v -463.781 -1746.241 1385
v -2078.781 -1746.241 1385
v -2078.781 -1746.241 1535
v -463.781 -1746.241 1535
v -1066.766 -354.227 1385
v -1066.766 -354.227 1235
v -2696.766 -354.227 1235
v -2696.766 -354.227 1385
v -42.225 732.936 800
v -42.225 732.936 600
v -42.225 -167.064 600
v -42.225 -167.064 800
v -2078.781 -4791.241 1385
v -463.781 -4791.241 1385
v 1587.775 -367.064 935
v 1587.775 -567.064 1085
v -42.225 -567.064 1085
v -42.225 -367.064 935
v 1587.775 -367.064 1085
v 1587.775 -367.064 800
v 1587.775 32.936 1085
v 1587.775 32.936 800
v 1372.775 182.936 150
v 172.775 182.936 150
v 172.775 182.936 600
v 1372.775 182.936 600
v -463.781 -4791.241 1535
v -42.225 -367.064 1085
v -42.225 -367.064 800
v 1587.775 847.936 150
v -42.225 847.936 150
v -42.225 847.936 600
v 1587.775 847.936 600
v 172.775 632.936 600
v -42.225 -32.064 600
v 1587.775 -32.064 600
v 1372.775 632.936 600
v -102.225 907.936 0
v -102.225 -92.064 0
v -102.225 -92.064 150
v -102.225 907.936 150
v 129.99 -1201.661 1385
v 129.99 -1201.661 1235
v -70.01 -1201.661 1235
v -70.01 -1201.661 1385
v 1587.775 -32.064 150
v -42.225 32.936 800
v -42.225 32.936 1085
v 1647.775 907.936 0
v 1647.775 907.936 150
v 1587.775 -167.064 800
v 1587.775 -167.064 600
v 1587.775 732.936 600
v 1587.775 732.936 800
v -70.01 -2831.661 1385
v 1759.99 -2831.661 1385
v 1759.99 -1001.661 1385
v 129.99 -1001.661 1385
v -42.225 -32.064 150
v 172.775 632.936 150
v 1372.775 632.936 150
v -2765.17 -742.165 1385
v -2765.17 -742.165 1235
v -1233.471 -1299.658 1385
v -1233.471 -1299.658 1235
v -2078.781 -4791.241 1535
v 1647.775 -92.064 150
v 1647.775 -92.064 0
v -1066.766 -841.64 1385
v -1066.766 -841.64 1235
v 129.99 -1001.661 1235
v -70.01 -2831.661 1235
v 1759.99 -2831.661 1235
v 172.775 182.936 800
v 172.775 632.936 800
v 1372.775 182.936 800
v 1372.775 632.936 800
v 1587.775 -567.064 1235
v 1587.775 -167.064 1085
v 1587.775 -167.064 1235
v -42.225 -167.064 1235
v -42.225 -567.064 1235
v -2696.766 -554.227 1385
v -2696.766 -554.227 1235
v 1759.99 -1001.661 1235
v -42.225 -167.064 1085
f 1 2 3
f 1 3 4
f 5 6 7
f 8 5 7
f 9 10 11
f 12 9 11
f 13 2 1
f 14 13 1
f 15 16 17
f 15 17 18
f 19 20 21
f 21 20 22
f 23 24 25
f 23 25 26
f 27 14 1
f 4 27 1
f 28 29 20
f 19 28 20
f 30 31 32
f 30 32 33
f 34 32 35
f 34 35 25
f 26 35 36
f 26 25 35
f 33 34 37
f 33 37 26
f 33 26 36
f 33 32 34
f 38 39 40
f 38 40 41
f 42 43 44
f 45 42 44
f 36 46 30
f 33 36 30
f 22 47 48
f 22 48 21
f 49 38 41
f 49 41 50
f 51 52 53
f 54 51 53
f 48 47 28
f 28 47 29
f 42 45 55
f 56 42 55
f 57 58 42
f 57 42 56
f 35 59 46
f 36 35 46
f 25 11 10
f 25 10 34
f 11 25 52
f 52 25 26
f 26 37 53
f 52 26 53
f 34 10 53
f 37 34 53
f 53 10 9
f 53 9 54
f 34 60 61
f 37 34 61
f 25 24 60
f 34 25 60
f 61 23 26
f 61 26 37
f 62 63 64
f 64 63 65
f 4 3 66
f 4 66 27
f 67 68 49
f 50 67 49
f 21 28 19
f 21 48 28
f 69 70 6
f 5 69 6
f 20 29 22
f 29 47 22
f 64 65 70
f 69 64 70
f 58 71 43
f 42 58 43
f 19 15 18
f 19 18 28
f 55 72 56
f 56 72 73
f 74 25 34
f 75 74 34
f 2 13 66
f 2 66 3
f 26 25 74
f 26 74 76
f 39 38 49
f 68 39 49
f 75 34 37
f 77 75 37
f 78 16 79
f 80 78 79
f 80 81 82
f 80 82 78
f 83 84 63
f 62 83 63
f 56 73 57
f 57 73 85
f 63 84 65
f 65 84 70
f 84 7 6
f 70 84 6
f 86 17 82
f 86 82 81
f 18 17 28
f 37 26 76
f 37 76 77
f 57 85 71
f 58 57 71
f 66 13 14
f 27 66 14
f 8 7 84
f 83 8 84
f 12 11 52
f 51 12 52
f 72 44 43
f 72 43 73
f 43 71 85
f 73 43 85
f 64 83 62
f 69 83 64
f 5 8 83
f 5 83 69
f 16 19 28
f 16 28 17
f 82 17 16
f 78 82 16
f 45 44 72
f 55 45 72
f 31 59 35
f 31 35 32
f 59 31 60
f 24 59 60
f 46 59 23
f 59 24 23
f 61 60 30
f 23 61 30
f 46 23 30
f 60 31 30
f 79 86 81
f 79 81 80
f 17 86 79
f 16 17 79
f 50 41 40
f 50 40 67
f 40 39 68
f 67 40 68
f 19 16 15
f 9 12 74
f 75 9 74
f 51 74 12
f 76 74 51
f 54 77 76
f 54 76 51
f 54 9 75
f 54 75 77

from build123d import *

# Parameters (mm, degrees)
F0_W      = 1750
F0_H      = 1000
F1_DEPTH  = 150
F2_W      = 1630
F2_H      = 880
F2_W_2    = 1200
F2_H_2    = 450
F3_DEPTH  = 450
F4_W      = 1630
F4_H      = 135
F4_H_2    = 765
F4_W_2    = 1200
F4_H_3    = 450
F5_DEPTH  = 200
F6_W      = 1630
F6_H      = 200
F7_DEPTH  = 285
F8_W      = 1630
F8_H      = 400
F9_DEPTH  = 150
F11_DEPTH = 1630
F13_DEPTH = 150
F14_W     = 1615
F14_H     = 3045
F15_DEPTH = 150
F17_DEPTH = 150


with BuildPart() as f1:
    # F0 (on Top) → F1 (new body)
    with BuildSketch(Plane.XY):
        with Locations((772.775441, 407.935686)):
            Rectangle(F0_W, F0_H)
    extrude(amount=F1_DEPTH)


with BuildPart() as f3:
    # F2 (on face) → F3 (new body)
    with BuildSketch(Plane.XY.offset(150)):
        with Locations((772.775441, 407.935686)):
            Rectangle(F2_W, F2_H)
        with Locations((772.775441, 407.935686)):
            Rectangle(F2_W_2, F2_H_2, mode=Mode.SUBTRACT)
    extrude(amount=F3_DEPTH)


with BuildPart() as f5:
    # F4 (on face) → F5 (new body)
    with BuildSketch(Plane.XY.offset(600)):
        with Locations((772.775441, -99.564314)):
            Rectangle(F4_W, F4_H)
        with Locations((772.775441, 350.435686)):
            Rectangle(F4_W, F4_H_2)
        with Locations((772.775441, 407.935686)):
            Rectangle(F4_W_2, F4_H_3, mode=Mode.SUBTRACT)
    extrude(amount=F5_DEPTH)


with BuildPart() as f7:
    # F6 (on face) → F7 (new body)
    with BuildSketch(Plane.XY.offset(800)):
        with Locations((772.775441, -267.064314)):
            Rectangle(F6_W, F6_H)
        with Locations((772.775441, -67.064314)):
            Rectangle(F6_W, F6_H)
    extrude(amount=F7_DEPTH)


with BuildPart() as f9:
    # F8 (on face) → F9 (new body)
    with BuildSketch(Plane.XY.offset(1085)):
        with Locations((772.775441, -367.064314)):
            Rectangle(F8_W, F8_H)
    extrude(amount=F9_DEPTH)


with BuildPart() as f11:
    # F10 (on face) → F11 (new body)
    with BuildSketch(Plane.YZ.offset(1587.775441)):
        Polygon((-367.064314, 935), (-367.064314, 1085), (-567.064314, 1085), align=None)
    extrude(amount=-F11_DEPTH)


with BuildPart() as f13:
    # F12 (on face) → F13 (new body)
    with BuildSketch(Plane.XY.offset(1235)):
        Polygon((1759.989725, -1001.661468), (129.989725, -1001.661468), (129.989725, -1201.661468), (-70.010275, -1201.661468), (-70.010275, -2831.661468), (1759.989725, -2831.661468), align=None)
    extrude(amount=F13_DEPTH)


with BuildPart() as f15:
    # F14 (on face) → F15 (new body)
    with BuildSketch(Plane.XY.offset(1385)):
        with Locations((-1271.28089, -3268.740692)):
            Rectangle(F14_W, F14_H)
    extrude(amount=F15_DEPTH)


with BuildPart() as f17:
    # F16 (on face) → F17 (new body)
    with BuildSketch(Plane.XY.offset(1235)):
        Polygon((-1066.766222, -841.639766), (-1066.766222, -354.226787), (-2696.766222, -354.226787), (-2696.766222, -554.226787), (-2765.17025, -742.165311), (-1233.471278, -1299.658145), align=None)
    extrude(amount=F17_DEPTH)


solid = Compound([f1.part, f3.part, f5.part, f7.part, f9.part, f11.part, f13.part, f15.part, f17.part])
